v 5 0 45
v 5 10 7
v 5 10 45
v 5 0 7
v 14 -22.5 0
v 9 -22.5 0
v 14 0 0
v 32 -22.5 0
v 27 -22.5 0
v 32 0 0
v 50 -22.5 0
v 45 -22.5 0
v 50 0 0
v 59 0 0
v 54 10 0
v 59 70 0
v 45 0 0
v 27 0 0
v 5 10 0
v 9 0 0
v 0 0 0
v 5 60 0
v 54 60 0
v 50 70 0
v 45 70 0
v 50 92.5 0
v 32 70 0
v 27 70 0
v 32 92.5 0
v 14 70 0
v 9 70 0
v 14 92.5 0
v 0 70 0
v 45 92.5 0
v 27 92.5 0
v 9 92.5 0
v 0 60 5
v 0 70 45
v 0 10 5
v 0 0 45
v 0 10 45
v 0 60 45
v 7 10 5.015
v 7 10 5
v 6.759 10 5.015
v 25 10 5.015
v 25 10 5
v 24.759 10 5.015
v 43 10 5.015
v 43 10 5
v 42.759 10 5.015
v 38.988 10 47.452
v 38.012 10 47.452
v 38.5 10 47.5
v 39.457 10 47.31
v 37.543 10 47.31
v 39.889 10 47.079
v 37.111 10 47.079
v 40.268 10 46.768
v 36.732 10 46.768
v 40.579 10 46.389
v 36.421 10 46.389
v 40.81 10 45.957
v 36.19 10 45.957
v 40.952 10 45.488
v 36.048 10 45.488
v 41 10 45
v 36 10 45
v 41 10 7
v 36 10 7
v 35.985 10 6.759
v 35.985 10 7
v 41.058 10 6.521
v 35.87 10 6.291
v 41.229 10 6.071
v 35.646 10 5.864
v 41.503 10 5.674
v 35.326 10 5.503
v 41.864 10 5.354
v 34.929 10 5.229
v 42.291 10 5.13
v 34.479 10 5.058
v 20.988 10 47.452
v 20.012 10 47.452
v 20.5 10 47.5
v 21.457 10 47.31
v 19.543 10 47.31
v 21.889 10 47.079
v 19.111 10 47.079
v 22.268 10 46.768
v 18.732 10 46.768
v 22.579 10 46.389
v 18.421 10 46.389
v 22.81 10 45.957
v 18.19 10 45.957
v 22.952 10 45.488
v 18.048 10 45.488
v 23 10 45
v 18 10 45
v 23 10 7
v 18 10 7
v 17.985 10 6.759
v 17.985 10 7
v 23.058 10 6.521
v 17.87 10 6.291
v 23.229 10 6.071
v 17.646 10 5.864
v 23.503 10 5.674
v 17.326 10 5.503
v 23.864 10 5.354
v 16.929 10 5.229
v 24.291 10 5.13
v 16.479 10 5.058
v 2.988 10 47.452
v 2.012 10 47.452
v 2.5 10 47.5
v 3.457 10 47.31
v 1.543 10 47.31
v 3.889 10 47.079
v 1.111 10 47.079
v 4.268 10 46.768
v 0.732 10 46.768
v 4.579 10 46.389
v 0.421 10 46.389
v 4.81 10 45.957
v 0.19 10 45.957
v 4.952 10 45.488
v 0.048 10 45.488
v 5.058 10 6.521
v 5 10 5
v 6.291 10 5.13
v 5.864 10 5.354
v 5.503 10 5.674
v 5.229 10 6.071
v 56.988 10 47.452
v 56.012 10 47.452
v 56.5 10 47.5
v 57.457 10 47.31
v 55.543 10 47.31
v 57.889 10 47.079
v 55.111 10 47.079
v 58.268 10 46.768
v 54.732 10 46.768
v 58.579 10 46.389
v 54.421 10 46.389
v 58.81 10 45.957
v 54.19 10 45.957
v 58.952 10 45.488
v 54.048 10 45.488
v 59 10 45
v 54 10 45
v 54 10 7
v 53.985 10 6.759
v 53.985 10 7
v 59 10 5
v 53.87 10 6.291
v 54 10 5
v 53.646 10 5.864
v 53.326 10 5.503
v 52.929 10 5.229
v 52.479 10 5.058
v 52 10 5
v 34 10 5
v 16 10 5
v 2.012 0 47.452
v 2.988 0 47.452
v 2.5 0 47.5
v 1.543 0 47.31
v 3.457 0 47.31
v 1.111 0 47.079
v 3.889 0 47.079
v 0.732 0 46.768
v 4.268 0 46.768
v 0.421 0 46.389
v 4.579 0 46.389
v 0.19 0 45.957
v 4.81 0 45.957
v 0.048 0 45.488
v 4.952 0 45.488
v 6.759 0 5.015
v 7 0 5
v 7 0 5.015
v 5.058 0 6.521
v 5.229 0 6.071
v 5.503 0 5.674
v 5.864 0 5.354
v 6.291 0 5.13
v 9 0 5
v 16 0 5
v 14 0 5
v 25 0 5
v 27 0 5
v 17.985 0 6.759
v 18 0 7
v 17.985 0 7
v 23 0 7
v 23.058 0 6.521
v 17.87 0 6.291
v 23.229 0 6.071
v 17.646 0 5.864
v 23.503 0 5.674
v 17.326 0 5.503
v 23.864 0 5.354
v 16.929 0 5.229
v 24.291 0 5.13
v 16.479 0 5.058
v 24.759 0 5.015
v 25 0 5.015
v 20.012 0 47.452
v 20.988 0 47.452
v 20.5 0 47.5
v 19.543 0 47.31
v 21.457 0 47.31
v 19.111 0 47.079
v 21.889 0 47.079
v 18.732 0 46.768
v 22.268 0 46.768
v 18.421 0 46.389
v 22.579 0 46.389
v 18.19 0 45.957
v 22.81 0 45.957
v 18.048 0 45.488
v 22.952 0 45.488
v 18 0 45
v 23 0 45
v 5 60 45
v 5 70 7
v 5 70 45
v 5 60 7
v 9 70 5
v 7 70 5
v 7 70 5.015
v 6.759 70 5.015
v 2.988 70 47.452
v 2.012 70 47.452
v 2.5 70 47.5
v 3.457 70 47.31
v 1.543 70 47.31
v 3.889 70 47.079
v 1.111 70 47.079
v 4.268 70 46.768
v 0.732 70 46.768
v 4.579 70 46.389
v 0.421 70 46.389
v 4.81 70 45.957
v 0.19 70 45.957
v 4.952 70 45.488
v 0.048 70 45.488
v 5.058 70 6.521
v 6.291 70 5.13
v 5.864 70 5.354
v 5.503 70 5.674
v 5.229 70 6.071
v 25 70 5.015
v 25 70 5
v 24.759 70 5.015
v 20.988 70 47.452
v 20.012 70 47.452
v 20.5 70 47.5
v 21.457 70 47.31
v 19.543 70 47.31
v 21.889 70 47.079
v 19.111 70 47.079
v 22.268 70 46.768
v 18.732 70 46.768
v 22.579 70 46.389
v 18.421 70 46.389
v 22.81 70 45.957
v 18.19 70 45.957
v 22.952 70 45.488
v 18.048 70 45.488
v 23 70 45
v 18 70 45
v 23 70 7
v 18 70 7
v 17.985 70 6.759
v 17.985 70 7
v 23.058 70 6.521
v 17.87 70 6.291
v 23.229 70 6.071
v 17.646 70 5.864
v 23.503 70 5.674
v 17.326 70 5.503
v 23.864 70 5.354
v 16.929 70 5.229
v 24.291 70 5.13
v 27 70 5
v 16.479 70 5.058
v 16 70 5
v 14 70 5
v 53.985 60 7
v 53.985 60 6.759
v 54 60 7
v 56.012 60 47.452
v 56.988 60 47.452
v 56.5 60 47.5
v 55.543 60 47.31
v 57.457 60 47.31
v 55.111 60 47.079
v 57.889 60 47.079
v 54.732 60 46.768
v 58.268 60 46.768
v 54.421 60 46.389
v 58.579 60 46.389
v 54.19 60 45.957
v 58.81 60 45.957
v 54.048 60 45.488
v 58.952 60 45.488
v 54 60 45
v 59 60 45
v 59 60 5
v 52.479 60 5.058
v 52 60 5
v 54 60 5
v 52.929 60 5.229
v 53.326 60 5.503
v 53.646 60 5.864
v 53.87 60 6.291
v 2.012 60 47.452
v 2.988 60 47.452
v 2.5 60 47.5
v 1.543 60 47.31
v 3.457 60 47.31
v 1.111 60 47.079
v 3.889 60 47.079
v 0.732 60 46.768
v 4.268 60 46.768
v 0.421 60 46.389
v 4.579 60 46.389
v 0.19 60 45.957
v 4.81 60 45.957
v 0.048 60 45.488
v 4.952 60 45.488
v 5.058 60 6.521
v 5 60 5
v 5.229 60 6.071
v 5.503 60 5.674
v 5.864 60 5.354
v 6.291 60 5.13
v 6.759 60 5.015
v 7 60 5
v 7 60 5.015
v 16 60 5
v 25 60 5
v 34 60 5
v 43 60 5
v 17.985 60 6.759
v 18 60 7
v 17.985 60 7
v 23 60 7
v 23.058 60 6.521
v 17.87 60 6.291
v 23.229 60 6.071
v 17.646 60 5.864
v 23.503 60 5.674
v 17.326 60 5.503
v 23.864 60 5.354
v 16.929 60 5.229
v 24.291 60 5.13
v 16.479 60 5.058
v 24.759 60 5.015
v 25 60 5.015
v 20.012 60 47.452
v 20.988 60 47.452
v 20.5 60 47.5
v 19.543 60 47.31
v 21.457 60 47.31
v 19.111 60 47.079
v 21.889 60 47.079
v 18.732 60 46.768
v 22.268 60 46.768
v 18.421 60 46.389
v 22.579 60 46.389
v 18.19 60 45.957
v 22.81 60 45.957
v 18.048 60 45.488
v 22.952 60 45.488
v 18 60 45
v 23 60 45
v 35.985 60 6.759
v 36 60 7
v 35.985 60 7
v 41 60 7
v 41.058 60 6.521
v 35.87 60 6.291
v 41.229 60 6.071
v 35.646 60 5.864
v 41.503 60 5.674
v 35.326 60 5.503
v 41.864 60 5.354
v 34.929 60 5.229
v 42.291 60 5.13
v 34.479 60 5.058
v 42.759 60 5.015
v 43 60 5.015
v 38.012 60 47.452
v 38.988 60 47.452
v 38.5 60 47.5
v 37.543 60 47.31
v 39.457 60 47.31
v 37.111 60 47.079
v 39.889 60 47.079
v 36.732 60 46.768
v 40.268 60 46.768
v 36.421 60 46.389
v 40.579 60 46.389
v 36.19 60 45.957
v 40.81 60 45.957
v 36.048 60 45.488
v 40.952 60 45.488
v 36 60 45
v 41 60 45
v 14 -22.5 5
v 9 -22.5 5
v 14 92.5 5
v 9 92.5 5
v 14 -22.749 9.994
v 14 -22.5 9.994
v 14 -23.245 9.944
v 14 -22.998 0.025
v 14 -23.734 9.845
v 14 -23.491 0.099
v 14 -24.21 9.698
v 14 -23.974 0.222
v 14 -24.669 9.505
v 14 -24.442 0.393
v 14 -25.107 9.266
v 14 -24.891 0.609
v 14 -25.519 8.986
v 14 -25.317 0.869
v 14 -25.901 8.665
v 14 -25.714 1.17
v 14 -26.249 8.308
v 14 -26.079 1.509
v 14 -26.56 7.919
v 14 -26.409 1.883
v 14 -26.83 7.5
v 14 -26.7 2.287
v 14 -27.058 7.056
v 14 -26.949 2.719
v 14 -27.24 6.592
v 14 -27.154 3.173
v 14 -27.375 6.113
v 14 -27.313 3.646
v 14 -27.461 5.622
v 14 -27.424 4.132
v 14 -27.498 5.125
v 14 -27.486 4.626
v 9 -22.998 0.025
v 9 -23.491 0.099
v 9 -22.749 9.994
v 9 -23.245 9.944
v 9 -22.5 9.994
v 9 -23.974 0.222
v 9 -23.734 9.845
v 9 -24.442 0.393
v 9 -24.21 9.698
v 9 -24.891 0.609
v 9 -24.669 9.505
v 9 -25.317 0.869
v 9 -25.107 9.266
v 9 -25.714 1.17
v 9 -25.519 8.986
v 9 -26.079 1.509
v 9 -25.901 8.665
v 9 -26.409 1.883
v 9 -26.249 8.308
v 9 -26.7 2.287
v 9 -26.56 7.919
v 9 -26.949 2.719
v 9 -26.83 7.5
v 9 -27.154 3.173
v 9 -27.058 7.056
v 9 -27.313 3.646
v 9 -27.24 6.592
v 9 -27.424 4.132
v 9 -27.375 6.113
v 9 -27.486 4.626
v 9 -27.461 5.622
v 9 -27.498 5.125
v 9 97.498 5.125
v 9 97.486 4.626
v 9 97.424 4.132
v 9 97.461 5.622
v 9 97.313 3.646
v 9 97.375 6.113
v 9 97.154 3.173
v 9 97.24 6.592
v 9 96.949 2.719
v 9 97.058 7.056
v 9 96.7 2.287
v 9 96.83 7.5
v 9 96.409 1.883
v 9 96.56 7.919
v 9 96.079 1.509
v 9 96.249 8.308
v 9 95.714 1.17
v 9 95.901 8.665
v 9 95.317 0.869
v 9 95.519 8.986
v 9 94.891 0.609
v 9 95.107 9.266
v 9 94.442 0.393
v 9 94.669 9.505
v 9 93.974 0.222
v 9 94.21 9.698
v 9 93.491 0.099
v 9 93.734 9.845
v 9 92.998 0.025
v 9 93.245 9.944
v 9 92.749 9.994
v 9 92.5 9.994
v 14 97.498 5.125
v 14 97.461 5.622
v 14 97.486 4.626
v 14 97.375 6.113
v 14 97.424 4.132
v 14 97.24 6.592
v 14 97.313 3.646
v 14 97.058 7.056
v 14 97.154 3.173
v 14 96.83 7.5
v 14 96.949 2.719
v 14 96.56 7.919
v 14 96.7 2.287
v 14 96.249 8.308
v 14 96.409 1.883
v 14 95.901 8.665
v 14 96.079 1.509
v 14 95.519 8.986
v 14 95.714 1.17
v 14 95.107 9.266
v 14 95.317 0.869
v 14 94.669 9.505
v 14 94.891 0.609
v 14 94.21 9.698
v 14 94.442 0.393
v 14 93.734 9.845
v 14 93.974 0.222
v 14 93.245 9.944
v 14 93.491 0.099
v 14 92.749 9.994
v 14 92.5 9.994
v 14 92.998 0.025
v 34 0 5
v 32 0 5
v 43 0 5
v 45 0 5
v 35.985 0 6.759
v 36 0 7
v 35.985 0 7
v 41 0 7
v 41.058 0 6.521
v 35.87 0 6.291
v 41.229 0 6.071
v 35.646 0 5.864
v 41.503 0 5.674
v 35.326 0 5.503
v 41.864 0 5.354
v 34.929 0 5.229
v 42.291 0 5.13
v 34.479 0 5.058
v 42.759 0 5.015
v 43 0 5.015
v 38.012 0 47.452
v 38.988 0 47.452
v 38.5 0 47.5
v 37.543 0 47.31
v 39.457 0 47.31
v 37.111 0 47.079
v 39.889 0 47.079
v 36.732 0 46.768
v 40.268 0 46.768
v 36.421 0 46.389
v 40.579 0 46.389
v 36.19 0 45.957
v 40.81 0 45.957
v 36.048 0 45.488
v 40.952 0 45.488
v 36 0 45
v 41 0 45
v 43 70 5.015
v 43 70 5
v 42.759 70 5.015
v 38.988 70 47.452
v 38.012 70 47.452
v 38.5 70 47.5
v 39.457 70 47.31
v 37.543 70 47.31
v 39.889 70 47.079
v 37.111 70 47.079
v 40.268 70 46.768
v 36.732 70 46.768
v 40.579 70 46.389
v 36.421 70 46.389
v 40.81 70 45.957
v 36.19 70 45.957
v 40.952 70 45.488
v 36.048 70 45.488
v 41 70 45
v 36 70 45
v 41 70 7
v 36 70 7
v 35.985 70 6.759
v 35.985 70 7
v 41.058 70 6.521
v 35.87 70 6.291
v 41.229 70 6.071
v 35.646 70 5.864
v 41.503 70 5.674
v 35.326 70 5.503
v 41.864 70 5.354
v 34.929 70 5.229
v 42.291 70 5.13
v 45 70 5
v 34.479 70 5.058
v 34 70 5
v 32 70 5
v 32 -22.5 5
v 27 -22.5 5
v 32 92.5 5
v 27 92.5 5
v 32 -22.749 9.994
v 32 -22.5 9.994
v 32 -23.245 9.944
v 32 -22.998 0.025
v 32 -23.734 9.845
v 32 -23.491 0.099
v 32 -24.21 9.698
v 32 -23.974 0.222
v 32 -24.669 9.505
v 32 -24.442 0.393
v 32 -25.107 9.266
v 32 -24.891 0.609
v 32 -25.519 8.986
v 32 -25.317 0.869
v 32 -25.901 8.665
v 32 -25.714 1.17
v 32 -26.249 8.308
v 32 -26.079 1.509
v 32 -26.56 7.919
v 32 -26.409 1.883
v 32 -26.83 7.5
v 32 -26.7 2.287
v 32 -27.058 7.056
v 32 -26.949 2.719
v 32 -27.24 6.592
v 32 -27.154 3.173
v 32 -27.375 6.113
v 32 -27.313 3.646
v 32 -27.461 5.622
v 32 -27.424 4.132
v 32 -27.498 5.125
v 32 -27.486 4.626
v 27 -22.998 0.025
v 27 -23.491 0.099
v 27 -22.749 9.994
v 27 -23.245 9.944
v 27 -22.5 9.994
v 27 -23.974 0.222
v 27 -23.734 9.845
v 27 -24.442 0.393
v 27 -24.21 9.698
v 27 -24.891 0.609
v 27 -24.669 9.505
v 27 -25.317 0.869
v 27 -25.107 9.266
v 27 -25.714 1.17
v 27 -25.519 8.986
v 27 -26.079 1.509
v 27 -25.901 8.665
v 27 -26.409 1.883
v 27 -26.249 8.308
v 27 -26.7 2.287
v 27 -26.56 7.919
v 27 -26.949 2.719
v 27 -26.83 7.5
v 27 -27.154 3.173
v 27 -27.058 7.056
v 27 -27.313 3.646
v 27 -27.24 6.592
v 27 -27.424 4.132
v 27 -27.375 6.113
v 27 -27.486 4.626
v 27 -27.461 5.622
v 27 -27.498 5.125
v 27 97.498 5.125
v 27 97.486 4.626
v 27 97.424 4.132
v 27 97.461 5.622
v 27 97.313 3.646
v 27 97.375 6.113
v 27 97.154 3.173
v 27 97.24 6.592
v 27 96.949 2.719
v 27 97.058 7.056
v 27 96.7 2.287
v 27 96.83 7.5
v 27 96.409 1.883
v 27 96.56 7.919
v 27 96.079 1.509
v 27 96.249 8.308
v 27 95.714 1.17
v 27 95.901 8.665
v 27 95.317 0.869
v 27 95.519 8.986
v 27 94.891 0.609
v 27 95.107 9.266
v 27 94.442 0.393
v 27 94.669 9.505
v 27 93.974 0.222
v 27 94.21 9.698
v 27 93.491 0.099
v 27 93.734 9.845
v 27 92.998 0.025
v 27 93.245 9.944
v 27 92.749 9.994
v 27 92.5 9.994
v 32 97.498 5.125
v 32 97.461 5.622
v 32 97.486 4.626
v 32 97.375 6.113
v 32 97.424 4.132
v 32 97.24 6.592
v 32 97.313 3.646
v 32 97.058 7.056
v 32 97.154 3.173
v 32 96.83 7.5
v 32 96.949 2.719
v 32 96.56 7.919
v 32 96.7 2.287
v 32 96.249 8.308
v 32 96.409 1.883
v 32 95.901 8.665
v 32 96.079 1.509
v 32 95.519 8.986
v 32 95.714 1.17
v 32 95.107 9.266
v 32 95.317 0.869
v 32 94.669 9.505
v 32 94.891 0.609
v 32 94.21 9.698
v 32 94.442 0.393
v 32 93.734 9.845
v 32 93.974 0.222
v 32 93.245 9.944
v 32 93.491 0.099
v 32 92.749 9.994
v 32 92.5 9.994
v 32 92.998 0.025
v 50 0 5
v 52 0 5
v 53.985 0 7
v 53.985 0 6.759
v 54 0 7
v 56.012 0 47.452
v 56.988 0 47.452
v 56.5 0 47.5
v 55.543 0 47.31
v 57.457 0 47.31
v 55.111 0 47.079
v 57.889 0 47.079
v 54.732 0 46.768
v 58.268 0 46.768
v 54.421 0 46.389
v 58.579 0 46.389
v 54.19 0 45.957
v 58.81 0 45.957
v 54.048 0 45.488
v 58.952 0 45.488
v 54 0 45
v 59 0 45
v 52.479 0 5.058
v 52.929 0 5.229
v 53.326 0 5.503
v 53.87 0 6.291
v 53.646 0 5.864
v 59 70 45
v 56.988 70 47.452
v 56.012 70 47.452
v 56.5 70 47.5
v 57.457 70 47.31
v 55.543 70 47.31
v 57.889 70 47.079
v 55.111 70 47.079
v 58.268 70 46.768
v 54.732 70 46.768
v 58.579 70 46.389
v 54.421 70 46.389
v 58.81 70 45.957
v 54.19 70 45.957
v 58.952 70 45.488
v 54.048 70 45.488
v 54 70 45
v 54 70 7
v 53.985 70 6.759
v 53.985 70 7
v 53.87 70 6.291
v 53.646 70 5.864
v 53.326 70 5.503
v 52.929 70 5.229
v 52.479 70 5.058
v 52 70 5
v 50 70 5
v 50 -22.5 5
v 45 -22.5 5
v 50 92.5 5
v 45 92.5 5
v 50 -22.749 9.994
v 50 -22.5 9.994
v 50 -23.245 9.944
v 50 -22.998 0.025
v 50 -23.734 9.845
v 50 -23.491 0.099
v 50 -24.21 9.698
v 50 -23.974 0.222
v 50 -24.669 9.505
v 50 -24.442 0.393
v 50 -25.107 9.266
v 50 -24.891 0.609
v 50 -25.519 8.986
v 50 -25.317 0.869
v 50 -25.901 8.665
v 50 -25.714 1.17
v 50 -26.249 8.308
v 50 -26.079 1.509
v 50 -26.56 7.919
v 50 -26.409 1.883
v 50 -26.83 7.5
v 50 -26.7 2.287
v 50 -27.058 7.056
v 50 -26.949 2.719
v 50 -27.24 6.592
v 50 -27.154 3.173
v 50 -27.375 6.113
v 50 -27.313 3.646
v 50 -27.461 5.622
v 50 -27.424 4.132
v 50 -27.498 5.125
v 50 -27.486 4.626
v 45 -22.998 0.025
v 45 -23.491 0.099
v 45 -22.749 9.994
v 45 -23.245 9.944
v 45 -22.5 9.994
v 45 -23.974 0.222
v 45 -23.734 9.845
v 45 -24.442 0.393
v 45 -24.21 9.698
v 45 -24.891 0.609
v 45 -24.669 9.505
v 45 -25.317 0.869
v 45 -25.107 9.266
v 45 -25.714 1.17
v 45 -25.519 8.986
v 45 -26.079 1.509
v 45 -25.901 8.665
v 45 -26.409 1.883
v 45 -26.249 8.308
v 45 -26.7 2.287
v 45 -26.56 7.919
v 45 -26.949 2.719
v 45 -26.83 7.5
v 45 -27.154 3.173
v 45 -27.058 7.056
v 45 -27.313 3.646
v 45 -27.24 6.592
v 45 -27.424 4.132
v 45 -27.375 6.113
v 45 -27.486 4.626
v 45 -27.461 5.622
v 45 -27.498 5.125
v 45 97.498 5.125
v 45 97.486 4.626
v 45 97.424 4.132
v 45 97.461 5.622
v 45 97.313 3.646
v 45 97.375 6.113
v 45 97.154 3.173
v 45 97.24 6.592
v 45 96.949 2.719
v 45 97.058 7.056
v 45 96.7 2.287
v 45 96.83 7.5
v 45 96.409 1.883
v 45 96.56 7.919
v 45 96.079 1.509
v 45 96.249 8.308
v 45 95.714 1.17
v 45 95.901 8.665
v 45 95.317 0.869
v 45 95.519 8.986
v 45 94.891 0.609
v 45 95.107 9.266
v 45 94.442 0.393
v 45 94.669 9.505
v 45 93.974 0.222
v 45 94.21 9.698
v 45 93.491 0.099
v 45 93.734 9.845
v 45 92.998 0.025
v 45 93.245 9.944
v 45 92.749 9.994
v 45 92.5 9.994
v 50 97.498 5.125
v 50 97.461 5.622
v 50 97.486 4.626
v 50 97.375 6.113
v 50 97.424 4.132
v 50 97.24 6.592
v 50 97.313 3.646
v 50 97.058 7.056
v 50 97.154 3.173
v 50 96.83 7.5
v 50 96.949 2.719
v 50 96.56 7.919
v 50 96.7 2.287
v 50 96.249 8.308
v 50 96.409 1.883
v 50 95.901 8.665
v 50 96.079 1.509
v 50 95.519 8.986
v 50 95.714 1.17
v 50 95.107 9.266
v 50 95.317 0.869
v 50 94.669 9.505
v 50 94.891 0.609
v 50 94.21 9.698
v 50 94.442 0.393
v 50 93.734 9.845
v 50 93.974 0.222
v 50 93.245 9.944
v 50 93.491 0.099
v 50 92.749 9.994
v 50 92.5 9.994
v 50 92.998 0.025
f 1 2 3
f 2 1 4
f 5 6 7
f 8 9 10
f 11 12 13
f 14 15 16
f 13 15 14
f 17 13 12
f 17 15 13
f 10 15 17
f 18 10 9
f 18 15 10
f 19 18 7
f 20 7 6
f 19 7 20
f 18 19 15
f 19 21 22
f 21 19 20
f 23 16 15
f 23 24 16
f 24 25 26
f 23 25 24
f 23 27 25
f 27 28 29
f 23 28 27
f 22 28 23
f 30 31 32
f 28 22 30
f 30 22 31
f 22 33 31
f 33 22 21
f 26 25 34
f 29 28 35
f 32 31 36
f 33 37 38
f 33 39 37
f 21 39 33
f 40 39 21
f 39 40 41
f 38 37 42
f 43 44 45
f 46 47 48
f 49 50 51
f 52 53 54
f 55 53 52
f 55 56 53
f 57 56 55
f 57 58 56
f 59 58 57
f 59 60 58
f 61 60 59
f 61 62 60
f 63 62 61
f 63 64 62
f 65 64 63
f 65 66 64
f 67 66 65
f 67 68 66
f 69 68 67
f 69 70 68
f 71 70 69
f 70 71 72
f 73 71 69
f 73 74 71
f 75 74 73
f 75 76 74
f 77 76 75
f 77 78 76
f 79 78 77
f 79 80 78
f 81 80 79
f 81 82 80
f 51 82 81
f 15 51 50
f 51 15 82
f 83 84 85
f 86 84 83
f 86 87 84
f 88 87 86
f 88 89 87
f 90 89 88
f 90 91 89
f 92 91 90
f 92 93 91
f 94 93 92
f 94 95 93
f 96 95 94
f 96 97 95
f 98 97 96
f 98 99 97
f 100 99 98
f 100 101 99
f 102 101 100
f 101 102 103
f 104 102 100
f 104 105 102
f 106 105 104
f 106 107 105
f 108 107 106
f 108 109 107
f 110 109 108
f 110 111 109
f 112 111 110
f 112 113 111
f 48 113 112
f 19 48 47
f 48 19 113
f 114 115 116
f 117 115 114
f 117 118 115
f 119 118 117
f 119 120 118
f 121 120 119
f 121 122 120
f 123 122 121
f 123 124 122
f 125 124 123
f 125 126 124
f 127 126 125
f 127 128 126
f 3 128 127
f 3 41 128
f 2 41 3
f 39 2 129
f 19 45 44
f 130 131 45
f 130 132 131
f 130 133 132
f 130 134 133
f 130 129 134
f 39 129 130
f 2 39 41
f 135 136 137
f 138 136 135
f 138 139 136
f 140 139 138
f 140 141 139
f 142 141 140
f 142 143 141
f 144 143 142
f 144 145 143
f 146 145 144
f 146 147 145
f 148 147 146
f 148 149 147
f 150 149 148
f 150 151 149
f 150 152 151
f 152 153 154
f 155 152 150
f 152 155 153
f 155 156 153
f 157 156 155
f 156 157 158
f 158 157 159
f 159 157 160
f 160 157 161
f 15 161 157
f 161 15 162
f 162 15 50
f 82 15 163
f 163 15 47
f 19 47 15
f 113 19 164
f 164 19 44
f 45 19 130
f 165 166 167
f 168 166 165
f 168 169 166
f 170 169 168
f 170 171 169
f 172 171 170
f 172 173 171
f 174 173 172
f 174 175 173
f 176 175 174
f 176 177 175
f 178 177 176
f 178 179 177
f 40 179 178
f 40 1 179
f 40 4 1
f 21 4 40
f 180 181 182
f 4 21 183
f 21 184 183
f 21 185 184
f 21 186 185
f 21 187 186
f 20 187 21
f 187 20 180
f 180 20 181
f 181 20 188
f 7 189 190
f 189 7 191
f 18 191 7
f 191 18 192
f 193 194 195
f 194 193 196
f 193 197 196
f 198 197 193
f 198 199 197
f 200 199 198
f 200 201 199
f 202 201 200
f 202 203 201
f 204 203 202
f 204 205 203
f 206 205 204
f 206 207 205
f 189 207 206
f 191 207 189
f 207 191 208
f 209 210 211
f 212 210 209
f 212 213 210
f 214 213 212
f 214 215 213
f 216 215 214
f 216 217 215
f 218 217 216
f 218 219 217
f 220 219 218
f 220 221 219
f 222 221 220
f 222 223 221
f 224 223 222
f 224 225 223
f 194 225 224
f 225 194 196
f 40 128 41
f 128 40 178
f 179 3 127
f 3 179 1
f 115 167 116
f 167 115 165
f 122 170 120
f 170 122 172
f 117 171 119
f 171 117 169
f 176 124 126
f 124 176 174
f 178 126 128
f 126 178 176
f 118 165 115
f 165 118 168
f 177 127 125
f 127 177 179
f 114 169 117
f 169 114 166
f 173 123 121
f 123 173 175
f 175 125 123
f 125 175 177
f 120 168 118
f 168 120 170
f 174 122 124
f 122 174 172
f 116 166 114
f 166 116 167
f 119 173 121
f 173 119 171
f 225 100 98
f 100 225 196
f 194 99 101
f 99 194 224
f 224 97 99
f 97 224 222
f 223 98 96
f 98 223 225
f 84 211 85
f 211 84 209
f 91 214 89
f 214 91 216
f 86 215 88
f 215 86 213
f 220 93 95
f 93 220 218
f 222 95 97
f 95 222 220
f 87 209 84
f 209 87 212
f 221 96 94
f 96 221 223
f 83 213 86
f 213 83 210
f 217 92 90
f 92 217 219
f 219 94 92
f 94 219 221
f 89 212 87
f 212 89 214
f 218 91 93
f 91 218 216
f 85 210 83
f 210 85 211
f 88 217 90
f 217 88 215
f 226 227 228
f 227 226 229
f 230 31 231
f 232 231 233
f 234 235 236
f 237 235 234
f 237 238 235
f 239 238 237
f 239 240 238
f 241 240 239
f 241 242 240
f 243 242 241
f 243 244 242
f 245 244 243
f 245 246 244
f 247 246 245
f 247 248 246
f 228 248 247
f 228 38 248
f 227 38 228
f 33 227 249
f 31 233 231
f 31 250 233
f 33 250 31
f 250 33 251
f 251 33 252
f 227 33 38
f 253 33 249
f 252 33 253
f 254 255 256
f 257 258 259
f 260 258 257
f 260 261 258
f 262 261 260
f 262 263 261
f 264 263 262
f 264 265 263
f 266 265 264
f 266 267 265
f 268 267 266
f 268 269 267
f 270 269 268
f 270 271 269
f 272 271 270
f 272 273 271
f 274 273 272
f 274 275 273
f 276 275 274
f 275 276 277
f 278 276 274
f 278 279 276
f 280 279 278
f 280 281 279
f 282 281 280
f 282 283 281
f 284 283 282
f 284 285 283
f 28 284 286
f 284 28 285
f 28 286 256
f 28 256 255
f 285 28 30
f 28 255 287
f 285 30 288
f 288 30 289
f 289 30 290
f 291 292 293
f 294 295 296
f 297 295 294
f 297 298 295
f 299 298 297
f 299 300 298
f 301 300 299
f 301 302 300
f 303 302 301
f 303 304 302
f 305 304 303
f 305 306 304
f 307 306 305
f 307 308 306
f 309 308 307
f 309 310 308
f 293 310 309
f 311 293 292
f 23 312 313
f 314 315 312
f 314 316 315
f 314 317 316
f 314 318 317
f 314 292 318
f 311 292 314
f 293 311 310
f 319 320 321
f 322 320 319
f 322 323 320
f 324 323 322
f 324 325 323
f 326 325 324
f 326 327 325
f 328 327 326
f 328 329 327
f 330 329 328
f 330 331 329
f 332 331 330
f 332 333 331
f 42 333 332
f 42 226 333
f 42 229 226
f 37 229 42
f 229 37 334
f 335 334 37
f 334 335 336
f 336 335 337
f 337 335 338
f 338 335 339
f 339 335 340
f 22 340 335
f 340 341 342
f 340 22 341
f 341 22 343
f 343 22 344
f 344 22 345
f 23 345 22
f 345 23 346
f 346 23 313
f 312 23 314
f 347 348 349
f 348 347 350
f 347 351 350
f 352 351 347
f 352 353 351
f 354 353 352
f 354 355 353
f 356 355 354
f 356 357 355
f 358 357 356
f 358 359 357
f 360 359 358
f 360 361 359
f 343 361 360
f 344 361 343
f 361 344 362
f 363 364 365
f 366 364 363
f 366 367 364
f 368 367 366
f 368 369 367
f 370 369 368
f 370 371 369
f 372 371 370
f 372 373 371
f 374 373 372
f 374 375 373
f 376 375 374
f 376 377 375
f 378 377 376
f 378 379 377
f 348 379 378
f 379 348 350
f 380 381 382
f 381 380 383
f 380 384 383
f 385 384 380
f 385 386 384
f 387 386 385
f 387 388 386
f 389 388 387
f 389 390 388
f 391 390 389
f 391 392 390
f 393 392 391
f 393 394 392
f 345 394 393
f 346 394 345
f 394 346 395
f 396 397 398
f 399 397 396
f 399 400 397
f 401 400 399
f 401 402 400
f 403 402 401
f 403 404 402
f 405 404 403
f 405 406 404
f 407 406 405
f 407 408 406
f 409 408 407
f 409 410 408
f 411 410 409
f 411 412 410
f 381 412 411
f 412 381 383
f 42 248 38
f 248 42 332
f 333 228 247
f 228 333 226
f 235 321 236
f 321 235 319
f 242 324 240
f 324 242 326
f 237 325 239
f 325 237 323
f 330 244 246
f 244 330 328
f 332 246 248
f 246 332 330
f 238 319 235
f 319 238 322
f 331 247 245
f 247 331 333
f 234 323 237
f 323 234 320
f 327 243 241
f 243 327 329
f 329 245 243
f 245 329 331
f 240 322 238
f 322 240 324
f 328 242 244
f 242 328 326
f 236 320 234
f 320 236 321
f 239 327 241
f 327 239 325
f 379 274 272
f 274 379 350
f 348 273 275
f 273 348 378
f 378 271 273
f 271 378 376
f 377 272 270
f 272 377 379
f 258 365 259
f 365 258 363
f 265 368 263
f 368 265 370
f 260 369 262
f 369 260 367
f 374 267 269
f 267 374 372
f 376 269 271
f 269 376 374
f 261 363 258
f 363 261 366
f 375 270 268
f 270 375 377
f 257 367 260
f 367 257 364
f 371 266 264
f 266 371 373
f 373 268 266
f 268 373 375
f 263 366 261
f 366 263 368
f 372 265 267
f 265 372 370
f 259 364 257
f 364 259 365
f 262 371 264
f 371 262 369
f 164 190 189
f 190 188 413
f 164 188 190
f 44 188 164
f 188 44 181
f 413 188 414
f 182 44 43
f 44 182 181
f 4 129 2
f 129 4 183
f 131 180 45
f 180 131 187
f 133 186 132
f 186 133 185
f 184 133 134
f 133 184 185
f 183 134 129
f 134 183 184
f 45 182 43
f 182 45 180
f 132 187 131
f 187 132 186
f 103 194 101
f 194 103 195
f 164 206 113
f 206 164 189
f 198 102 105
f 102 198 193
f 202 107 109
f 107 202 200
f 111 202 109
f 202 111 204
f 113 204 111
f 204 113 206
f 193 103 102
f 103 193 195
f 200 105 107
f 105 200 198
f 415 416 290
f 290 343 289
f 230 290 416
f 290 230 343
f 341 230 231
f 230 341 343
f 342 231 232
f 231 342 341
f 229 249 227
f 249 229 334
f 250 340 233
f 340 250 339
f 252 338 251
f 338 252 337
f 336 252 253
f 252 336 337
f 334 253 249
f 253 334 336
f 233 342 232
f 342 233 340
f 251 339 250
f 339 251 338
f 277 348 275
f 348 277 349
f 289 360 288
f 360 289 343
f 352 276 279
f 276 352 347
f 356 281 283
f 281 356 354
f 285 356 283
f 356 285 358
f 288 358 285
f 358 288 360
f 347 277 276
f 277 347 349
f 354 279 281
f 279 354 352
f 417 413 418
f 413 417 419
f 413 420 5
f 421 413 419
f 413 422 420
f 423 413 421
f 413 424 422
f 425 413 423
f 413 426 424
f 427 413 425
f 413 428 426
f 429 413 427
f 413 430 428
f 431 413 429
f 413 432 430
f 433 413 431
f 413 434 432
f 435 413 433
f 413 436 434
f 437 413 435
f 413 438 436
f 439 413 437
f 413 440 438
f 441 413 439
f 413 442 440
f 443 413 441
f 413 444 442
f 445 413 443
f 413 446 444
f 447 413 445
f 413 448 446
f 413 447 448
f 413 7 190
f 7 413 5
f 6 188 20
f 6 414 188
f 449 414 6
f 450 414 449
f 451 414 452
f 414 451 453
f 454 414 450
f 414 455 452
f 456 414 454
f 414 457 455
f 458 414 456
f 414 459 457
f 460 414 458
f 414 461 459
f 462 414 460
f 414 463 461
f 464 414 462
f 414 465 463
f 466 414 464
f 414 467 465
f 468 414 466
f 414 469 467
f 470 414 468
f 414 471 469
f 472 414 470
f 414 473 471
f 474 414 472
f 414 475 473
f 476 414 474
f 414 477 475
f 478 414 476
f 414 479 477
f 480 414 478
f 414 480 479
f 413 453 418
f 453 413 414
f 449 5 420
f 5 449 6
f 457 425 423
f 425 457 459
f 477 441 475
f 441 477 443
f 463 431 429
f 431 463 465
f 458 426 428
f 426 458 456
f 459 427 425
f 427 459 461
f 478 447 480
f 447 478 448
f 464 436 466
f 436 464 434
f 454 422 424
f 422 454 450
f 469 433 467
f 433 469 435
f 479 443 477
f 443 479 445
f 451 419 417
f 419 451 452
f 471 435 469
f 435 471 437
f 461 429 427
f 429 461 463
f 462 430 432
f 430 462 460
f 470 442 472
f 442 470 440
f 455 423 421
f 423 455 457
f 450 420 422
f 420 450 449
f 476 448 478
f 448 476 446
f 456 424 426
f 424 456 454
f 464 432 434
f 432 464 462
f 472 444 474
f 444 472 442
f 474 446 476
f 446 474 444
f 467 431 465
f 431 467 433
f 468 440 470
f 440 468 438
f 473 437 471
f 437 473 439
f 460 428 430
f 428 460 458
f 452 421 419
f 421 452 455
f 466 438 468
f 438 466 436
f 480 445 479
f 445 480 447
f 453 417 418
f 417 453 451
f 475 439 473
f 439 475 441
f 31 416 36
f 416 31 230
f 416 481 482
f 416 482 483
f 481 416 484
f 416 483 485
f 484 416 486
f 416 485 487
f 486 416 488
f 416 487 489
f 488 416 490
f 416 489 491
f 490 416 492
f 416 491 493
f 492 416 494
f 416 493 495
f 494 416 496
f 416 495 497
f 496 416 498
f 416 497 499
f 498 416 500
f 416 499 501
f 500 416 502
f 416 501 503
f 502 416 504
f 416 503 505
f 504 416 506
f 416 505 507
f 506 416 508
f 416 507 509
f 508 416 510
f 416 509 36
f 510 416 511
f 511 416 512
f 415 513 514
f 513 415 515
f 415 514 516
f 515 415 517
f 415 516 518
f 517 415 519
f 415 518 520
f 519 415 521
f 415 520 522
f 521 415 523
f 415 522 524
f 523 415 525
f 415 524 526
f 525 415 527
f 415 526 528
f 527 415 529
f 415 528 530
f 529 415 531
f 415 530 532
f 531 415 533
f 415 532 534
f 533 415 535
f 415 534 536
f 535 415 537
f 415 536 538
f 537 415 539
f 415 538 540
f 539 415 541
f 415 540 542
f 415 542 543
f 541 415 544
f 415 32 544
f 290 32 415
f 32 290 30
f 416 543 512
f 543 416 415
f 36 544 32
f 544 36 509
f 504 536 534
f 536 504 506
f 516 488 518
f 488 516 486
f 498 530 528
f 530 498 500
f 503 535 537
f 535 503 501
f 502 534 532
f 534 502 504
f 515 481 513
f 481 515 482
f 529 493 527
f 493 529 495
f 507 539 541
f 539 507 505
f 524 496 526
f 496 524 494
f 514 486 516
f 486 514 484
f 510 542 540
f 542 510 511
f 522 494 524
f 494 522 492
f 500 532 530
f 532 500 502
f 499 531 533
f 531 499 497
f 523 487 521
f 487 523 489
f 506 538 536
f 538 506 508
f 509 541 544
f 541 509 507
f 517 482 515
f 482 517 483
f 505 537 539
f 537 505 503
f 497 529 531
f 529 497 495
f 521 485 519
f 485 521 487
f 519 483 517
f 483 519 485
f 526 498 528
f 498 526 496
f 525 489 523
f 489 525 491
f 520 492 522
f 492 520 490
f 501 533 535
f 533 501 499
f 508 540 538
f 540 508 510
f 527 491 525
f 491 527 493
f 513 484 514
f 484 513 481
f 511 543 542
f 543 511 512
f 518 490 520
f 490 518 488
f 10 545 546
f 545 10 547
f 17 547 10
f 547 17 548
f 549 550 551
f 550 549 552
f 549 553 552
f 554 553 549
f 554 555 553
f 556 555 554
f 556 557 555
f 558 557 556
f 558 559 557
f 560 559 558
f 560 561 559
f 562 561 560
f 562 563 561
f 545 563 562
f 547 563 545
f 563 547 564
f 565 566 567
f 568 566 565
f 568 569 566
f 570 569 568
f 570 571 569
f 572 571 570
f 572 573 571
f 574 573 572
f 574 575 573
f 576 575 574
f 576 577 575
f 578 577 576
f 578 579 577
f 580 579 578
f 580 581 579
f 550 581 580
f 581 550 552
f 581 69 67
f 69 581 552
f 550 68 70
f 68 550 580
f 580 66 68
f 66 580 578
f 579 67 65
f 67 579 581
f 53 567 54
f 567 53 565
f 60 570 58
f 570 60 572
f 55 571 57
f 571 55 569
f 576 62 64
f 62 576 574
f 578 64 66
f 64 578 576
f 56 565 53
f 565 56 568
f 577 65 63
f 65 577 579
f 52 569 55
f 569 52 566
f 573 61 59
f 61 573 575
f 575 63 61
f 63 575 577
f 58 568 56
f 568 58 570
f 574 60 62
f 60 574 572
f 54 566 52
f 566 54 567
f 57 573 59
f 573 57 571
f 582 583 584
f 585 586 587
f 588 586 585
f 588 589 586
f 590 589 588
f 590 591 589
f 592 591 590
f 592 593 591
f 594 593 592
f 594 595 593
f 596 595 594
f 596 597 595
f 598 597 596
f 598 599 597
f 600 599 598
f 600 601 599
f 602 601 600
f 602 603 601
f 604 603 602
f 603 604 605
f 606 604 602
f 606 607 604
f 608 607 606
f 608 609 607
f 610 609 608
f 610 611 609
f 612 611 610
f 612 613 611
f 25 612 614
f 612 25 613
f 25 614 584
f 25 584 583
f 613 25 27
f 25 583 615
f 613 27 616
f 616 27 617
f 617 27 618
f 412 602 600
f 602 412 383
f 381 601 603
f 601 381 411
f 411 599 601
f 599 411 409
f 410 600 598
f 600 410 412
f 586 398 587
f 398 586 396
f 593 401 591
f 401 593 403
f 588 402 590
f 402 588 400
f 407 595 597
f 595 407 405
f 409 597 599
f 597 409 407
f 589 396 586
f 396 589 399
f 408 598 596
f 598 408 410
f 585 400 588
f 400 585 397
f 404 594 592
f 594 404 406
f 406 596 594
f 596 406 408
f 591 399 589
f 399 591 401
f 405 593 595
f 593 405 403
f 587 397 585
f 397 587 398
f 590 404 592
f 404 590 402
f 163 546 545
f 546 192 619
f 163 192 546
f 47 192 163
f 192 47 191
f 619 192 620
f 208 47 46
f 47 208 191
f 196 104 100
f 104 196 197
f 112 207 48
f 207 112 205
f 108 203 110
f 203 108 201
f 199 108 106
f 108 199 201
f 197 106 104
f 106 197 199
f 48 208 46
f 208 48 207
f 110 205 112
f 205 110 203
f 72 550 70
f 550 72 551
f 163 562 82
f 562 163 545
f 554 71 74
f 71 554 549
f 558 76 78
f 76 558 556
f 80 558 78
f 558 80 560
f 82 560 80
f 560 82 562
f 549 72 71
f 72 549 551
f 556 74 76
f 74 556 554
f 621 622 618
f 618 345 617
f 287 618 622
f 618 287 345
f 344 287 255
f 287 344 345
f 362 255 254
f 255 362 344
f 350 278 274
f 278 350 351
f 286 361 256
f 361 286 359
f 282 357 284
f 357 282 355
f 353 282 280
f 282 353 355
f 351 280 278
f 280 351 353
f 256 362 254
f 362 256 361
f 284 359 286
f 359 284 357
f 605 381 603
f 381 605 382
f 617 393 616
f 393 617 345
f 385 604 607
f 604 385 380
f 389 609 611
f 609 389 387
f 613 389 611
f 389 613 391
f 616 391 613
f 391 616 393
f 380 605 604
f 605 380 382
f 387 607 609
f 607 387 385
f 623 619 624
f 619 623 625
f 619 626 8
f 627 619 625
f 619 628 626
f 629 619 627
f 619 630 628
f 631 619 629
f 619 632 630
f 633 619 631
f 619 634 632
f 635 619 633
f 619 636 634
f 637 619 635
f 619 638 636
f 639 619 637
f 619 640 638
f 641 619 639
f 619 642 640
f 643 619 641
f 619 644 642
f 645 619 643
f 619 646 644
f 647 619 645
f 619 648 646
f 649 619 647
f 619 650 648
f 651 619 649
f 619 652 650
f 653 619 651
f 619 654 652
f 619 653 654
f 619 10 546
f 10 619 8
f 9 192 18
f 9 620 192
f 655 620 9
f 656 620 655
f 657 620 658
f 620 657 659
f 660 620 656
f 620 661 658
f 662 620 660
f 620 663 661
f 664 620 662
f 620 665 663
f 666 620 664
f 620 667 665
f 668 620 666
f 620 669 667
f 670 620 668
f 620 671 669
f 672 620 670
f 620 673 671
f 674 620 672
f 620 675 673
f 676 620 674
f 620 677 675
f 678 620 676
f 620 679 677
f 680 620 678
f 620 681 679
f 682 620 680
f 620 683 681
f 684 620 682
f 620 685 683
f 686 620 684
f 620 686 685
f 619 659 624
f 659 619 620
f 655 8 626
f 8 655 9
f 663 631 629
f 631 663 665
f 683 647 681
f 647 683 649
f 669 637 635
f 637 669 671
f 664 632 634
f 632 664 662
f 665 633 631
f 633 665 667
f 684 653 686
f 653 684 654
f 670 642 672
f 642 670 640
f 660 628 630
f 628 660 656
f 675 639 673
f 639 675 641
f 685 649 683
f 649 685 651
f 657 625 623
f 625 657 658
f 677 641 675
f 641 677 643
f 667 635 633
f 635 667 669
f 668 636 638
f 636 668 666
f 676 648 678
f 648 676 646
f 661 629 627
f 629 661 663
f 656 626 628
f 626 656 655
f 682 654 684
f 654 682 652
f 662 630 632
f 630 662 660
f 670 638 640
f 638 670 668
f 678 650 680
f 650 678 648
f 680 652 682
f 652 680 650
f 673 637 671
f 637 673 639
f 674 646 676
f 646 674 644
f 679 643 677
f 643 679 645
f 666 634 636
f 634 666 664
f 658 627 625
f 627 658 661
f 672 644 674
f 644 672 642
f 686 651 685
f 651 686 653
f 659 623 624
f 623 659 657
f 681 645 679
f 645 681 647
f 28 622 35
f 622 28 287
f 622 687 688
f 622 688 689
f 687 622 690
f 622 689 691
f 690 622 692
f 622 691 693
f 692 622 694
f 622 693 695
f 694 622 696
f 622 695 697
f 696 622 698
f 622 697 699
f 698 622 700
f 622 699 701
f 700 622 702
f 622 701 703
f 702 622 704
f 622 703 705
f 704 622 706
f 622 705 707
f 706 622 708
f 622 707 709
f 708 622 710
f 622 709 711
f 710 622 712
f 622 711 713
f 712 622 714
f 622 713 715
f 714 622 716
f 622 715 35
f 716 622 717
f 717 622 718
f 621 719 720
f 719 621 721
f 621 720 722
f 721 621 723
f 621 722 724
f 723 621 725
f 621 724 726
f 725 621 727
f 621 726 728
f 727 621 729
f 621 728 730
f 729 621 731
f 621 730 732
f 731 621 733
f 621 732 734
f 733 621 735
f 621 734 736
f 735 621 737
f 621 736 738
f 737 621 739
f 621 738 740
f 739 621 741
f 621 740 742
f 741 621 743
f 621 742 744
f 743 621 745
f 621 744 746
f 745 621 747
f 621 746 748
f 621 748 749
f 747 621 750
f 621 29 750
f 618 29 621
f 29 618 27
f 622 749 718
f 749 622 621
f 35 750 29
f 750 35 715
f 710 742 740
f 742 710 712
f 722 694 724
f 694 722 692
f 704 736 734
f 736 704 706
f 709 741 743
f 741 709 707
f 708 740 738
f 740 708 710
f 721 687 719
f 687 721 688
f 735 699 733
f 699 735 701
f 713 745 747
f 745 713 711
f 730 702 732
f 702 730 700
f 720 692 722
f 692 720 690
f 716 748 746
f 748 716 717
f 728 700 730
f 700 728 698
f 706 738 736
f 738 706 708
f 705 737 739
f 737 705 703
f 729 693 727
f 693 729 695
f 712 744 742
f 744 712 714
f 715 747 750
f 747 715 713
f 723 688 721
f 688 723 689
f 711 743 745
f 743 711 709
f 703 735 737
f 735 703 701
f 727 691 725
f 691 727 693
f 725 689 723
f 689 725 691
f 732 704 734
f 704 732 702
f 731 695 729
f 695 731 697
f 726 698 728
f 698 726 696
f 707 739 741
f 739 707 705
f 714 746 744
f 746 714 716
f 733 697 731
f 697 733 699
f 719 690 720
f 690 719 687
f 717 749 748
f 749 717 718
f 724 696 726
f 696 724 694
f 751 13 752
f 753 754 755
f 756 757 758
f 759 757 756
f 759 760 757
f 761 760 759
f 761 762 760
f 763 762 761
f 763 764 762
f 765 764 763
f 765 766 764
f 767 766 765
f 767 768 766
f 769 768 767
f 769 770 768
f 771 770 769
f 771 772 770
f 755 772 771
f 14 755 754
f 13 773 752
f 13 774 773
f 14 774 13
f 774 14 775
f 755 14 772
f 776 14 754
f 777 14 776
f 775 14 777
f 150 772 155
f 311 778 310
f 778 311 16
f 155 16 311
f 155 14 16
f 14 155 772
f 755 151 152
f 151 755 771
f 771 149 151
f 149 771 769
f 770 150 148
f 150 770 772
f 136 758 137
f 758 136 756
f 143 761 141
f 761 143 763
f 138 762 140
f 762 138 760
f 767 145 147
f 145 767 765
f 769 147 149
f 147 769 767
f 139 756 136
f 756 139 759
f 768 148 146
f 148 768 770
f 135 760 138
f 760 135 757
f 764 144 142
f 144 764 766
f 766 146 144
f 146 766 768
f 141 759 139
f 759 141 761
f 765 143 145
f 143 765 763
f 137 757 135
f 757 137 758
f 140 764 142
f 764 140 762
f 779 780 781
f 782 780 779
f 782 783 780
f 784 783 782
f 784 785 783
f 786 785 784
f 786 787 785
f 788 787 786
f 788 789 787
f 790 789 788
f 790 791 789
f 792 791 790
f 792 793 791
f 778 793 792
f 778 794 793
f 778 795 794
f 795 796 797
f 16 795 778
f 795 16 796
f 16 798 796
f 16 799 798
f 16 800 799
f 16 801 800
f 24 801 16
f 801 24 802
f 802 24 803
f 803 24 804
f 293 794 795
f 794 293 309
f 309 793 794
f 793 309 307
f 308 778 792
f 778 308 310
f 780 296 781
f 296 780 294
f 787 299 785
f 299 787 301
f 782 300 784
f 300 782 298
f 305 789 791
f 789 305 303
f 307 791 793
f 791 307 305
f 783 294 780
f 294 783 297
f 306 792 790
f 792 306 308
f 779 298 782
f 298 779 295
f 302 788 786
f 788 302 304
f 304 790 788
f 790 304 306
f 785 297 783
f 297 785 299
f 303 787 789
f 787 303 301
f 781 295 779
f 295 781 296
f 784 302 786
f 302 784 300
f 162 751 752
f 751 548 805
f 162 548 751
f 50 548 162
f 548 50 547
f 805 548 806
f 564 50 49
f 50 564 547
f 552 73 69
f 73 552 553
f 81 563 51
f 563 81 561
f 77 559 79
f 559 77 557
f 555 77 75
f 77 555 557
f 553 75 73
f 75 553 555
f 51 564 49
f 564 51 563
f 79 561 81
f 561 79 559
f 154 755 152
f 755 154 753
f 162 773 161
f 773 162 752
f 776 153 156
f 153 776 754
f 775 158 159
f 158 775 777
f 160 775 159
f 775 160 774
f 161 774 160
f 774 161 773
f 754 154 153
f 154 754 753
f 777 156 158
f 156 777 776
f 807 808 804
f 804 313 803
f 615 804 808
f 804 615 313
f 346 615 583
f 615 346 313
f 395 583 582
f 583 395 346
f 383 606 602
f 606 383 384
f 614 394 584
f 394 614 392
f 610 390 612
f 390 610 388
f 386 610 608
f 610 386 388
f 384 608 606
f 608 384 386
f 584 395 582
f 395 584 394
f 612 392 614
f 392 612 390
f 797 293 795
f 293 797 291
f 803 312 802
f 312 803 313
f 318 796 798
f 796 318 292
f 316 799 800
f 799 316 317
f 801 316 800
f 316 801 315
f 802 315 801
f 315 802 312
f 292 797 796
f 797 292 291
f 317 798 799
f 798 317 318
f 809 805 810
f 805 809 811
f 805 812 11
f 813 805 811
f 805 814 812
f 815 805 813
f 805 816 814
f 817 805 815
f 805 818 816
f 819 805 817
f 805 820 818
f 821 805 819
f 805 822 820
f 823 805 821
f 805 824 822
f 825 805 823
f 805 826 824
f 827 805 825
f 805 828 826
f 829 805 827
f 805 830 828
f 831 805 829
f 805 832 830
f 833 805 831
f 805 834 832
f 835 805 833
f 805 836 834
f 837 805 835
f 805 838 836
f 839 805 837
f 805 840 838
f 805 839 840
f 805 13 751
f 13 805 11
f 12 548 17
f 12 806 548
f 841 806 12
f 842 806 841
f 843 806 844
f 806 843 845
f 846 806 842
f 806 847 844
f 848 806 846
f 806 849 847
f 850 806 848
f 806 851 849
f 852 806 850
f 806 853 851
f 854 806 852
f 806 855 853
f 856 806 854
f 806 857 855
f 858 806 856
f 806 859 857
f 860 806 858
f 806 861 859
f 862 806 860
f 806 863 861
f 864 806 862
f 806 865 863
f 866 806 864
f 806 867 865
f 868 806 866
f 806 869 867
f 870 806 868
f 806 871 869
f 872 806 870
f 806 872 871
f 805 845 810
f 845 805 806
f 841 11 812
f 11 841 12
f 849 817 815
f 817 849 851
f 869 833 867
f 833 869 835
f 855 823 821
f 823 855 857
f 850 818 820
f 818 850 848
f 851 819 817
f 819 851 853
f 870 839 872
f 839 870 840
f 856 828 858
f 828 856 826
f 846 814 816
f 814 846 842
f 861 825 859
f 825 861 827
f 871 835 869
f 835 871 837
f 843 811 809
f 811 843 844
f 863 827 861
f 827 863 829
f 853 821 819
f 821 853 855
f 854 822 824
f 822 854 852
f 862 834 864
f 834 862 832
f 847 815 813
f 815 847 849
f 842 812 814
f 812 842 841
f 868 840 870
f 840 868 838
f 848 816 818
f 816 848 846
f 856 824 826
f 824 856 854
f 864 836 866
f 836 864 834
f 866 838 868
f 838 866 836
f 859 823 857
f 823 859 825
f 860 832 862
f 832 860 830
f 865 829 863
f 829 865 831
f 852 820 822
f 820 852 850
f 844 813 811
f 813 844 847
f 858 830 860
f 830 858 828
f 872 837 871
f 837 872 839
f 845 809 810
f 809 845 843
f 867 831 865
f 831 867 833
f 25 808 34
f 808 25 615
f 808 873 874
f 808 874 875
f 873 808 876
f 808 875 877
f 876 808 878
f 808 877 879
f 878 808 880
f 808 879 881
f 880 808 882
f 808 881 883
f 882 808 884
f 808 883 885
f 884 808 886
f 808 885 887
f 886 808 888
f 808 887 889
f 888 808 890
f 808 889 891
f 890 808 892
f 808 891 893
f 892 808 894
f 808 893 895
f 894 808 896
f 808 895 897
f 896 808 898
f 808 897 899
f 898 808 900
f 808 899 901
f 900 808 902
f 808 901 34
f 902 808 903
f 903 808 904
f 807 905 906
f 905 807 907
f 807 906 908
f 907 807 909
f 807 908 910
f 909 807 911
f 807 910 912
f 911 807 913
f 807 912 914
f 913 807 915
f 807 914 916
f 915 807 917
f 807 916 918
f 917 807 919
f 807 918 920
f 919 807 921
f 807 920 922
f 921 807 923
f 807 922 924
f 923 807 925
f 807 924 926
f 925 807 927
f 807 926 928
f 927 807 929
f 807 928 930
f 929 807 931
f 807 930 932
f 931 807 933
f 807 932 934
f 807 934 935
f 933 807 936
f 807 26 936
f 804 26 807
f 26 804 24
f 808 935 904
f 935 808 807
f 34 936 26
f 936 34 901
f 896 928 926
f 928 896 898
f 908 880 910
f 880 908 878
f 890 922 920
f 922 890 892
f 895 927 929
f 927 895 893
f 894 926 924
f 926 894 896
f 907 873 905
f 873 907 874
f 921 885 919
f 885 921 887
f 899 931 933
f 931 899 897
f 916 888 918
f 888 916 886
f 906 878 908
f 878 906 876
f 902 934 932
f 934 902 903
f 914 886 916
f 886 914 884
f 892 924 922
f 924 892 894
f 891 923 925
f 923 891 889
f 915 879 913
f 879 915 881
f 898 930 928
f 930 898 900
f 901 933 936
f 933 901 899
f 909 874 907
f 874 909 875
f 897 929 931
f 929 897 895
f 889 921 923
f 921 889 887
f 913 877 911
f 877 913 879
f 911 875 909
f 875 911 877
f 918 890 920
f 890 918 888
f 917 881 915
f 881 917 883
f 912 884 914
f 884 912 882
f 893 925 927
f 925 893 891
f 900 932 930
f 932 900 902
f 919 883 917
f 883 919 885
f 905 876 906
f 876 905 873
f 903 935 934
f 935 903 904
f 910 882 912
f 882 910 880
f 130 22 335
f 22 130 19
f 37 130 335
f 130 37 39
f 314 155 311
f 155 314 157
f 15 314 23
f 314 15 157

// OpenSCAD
$fa=0.5; // default minimum facet angle is now 0.5
$fs=0.5; // default minimum facet size is now 0.5 mm

n = 3;

hd_w = 13;
hd_d = 115;
arm_h = 40;
arm_d = 10;
arm_w = 5;
arms_d = 60;
round = 2;


offset = (arm_w + hd_w);
h = arm_h + arm_w;

for (i = [0:n-1]) {
    translate([i*offset, 0, 0]) full_arm();
}

translate([0, 0, 0]) cube([arm_w, arms_d + arm_d, arm_w]);
translate([offset * n, 0, 0]) cube([arm_w, arms_d + arm_d, arm_w]);

module column() {
    translate([0, 0, 0]) cube([arm_w, arm_d, h]);
    translate([arm_w/2, 0, h]) rotate([-90, 0, 0]) cylinder(d=arm_w, h=arm_d);
}

module bottom_round(r) {
    translate([r, 0, r]) rotate([0, 180, 0])
    difference() {
        translate([0, 0, 0]) cube([r, arm_d, r]);
        translate([0, -1, 0]) rotate([-90, 0, 0]) cylinder(d=r*2, h=arm_d+2);
    }
}

module rounds() {
    translate([arm_w, 0, arm_w]) bottom_round(round);
    translate([offset, 0, arm_w]) rotate([0, -90, 0]) bottom_round(round);
}

module arm_ends() {
    intersection() {
        translate([0, -arm_w, 0]) cube([arm_w, arm_w, arm_w * 2]);
        translate([0, 0, arm_w]) rotate([0, 90, 0]) cylinder(d=arm_w * 2, h=arm_w);
    }
}

module full_arm() {
    translate([0, 0, 0]) column();
    translate([offset, 0, 0]) column();
    translate([0, arms_d, 0]) column();
    translate([offset, arms_d, 0]) column();
    
    translate([0, 0, 0]) cube([arm_w + offset, arm_d, arm_w]);
    translate([0, arms_d, 0]) cube([arm_w + offset, arm_d, arm_w]);
    
    translate([0, 0, 0]) rounds();
    translate([0, arms_d, 0]) rounds();
    
    translate([(arm_w + hd_w)/2, -(hd_d - arms_d - arm_d) / 2, 0]) cube([arm_w, (hd_d - arms_d - arm_d) / 2, arm_w]);
    translate([(arm_w + hd_w)/2, arms_d + arm_d, 0]) cube([arm_w, (hd_d - arms_d - arm_d) / 2, arm_w]);
    
    translate([(arm_w + hd_w)/2, -(hd_d - arms_d - arm_d) / 2 , 0]) arm_ends();
    translate([arm_w + (arm_w + hd_w)/2, hd_d-(hd_d - arms_d - arm_d) / 2 , 0]) rotate([0, 0, 180]) arm_ends();
}
